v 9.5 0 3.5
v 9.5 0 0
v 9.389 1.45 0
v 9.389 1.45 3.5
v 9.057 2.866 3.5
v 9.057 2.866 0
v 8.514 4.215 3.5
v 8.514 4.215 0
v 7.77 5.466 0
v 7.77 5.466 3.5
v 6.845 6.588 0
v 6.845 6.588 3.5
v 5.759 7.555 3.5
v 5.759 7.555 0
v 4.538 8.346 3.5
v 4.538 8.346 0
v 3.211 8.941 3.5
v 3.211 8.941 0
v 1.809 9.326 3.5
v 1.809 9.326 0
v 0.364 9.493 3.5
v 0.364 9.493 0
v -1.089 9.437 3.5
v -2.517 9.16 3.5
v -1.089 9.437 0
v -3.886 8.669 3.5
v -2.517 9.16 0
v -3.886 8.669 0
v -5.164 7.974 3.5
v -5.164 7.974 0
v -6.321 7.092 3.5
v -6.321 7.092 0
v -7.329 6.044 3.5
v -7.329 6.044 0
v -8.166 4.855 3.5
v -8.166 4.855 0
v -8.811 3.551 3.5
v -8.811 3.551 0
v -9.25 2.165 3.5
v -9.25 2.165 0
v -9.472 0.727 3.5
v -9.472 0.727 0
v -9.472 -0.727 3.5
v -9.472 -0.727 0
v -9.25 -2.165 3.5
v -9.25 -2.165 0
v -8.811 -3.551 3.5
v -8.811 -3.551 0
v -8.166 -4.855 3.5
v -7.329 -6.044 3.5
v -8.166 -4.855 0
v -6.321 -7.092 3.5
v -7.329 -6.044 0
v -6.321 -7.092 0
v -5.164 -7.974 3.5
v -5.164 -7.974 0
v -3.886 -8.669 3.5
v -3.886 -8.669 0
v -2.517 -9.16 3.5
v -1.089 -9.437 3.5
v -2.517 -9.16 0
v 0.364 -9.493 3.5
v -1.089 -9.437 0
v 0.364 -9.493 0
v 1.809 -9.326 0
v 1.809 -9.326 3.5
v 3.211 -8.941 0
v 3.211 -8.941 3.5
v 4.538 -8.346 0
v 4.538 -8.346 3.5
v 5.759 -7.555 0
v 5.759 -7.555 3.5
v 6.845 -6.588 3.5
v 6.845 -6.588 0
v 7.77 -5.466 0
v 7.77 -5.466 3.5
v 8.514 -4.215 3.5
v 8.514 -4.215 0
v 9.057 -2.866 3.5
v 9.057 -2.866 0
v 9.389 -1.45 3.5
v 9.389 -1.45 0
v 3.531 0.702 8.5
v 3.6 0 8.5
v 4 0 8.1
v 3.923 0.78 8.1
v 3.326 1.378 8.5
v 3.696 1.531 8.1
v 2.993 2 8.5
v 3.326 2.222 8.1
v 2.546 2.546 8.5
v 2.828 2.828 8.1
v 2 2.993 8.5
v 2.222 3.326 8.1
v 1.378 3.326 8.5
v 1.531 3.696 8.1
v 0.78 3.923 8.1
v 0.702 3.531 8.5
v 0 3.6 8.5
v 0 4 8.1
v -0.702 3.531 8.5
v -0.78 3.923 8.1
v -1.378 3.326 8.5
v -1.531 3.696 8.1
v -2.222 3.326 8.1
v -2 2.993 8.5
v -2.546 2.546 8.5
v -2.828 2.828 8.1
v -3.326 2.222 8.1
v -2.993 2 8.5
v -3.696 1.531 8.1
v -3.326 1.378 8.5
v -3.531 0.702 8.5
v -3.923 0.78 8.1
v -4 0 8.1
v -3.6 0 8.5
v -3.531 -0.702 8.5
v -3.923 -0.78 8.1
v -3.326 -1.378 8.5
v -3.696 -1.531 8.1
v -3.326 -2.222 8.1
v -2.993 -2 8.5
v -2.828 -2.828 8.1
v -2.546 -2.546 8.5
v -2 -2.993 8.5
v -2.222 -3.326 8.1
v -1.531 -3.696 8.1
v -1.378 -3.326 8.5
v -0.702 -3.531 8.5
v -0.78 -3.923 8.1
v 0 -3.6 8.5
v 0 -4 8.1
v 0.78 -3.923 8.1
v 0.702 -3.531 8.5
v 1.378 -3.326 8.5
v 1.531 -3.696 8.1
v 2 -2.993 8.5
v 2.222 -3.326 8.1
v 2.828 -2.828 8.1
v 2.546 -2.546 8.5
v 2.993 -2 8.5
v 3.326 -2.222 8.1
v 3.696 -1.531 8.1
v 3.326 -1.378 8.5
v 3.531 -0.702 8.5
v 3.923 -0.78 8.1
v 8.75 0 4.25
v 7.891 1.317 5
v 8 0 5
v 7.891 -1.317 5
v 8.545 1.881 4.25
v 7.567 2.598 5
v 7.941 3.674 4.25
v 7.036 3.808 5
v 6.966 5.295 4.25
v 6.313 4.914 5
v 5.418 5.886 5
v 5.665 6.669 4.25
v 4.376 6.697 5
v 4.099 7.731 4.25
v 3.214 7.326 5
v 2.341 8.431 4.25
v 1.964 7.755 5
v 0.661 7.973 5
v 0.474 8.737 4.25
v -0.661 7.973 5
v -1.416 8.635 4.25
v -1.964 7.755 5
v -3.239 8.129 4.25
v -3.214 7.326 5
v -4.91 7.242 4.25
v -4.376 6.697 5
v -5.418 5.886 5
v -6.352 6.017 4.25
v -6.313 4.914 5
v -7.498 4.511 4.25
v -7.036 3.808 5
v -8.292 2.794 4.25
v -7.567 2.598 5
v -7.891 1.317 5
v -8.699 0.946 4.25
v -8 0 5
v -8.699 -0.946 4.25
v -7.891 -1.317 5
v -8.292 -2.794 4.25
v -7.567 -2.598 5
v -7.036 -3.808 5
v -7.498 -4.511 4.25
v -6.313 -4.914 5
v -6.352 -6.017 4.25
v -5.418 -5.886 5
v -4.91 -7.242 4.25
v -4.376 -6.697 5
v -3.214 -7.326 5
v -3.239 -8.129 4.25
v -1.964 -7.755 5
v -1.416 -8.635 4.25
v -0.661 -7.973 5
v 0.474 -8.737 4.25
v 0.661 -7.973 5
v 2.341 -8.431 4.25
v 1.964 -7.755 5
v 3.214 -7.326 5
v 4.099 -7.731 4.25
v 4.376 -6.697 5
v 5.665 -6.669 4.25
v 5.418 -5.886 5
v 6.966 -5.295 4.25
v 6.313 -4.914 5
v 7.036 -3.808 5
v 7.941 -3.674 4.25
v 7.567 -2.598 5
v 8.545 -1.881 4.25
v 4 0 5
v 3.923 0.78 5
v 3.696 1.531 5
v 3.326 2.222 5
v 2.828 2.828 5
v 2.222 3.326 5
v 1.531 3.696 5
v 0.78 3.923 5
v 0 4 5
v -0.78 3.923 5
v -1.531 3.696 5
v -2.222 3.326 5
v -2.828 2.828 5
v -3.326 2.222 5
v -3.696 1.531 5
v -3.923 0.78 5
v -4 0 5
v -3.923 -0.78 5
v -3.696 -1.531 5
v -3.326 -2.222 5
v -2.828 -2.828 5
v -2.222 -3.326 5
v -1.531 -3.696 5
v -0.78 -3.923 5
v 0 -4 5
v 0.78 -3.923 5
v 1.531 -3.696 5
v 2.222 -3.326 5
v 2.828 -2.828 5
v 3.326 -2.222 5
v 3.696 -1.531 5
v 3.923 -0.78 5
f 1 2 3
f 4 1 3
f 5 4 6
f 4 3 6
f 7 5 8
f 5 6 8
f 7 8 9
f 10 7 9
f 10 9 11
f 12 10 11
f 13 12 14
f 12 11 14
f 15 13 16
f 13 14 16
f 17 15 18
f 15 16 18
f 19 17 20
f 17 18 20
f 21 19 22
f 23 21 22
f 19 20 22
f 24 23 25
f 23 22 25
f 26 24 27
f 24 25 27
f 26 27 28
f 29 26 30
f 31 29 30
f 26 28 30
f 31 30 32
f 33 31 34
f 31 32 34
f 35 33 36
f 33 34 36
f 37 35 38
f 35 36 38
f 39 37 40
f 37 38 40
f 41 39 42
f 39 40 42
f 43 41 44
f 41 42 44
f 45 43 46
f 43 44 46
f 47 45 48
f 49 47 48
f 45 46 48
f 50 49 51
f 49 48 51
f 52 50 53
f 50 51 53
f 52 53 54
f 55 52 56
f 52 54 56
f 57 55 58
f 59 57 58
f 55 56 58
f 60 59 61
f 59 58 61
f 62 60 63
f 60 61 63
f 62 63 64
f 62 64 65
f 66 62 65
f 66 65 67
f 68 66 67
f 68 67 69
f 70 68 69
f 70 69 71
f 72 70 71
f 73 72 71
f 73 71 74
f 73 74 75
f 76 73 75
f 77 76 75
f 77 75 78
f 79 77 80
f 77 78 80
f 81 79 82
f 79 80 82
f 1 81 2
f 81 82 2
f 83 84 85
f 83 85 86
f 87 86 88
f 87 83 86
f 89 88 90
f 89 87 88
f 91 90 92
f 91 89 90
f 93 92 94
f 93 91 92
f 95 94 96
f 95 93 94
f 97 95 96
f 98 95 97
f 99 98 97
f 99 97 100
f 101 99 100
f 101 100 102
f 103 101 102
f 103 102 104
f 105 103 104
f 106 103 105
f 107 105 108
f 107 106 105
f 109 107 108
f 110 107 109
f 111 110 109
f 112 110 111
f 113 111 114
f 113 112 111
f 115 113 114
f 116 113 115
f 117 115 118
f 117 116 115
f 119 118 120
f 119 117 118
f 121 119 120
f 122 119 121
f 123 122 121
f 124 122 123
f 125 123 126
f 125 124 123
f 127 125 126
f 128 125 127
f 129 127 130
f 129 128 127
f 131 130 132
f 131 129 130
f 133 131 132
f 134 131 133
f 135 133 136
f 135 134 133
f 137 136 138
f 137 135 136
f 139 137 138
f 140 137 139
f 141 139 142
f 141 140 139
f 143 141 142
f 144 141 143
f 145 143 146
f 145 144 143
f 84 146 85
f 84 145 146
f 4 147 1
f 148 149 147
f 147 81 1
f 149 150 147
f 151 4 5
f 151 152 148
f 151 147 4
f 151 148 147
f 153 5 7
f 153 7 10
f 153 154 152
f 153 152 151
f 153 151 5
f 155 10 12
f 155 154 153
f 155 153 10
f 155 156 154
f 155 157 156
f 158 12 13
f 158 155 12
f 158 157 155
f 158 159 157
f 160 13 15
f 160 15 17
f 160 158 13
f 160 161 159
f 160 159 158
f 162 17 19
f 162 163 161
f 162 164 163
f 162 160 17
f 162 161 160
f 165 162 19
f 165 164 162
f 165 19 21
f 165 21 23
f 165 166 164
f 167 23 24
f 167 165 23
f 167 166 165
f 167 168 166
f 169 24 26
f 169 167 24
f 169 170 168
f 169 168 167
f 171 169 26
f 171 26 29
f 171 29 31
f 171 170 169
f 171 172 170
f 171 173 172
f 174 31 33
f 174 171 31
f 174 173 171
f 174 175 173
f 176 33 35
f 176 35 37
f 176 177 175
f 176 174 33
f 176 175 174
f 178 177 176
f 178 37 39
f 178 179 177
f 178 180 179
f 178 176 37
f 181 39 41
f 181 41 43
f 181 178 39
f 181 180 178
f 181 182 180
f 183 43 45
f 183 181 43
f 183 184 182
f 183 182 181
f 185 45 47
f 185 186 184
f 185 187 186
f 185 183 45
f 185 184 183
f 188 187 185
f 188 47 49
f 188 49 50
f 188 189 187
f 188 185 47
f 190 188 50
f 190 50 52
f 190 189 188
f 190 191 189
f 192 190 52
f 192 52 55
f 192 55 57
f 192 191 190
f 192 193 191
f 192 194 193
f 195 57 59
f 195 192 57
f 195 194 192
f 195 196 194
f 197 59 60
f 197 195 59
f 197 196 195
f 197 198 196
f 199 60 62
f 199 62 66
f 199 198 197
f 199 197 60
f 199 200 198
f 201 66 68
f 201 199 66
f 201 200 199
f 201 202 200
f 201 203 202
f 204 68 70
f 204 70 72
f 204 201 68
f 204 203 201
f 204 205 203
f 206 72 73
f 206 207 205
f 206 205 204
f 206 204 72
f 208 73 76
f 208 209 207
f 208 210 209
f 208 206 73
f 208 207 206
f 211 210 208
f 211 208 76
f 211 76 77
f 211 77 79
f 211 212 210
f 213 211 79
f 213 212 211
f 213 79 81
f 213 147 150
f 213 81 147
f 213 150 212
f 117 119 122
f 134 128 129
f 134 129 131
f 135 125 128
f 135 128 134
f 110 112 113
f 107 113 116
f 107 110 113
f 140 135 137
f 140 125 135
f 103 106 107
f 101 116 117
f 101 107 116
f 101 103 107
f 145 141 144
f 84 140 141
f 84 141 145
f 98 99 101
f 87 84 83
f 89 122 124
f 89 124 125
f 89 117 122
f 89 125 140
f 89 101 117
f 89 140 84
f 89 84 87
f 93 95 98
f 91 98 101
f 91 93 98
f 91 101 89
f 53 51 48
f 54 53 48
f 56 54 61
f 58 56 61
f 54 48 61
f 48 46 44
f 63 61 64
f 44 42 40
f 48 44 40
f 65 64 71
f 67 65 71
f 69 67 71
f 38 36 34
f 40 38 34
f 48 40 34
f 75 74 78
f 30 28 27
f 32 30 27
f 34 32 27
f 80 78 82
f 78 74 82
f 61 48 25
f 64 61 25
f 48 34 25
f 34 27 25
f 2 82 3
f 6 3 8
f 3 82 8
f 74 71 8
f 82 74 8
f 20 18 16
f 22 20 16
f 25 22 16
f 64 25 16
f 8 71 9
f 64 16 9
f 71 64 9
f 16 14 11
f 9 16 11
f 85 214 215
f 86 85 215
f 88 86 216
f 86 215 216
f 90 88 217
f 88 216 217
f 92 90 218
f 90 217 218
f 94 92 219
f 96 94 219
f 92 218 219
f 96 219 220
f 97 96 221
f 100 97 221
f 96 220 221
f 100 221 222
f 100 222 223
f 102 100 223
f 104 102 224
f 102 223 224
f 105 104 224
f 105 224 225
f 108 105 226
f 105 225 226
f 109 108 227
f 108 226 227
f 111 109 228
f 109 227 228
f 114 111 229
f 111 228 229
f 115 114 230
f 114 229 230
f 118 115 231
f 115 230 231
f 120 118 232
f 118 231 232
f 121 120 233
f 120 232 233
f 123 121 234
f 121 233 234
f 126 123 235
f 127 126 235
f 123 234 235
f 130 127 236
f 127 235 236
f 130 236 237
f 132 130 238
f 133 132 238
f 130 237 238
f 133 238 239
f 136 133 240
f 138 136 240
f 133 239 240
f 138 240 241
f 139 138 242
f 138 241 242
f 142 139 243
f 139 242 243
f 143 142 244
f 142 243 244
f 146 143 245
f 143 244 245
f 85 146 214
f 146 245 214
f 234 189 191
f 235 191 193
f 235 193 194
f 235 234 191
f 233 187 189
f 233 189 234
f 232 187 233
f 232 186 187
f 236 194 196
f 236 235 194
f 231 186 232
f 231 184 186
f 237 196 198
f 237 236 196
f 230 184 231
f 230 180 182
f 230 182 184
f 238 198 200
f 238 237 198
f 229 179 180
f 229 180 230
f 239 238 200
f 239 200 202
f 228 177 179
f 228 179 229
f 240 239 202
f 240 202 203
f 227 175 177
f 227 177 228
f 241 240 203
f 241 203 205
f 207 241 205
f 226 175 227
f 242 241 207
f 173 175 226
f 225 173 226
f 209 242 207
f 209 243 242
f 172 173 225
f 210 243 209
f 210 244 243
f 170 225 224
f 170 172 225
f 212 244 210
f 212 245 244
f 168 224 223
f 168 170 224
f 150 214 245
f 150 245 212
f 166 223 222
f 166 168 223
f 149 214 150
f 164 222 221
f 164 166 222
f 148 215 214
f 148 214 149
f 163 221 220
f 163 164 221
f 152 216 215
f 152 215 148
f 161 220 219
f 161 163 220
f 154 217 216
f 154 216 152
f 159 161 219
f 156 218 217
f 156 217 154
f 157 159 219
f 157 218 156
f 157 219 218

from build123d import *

# Parameters (mm, degrees)
F0_R     = 9.5
F1_DEPTH = 5
F2_R     = 4
F3_DEPTH = 3.5
F4_SIZE  = 1.5
F5_SIZE  = 0.4


with BuildPart() as f1:
    # F0 (on Top) → F1 (new body)
    with BuildSketch(Plane.XY):
        Circle(F0_R)
    extrude(amount=F1_DEPTH)

    # F2 (on face) → F3 (join)
    with BuildSketch(Plane.XY.offset(5)):
        Circle(F2_R)
    extrude(amount=F3_DEPTH)

    # F4
    f4_edges = [f1.edges().sort_by_distance(p)[0] for p in [
        (-9.5, 0, 5),
    ]]
    chamfer(f4_edges, length=F4_SIZE)

    # F5
    f5_edges = [f1.edges().sort_by_distance(p)[0] for p in [
        (-4, 0, 8.5),
    ]]
    chamfer(f5_edges, length=F5_SIZE)


solid = f1.part
